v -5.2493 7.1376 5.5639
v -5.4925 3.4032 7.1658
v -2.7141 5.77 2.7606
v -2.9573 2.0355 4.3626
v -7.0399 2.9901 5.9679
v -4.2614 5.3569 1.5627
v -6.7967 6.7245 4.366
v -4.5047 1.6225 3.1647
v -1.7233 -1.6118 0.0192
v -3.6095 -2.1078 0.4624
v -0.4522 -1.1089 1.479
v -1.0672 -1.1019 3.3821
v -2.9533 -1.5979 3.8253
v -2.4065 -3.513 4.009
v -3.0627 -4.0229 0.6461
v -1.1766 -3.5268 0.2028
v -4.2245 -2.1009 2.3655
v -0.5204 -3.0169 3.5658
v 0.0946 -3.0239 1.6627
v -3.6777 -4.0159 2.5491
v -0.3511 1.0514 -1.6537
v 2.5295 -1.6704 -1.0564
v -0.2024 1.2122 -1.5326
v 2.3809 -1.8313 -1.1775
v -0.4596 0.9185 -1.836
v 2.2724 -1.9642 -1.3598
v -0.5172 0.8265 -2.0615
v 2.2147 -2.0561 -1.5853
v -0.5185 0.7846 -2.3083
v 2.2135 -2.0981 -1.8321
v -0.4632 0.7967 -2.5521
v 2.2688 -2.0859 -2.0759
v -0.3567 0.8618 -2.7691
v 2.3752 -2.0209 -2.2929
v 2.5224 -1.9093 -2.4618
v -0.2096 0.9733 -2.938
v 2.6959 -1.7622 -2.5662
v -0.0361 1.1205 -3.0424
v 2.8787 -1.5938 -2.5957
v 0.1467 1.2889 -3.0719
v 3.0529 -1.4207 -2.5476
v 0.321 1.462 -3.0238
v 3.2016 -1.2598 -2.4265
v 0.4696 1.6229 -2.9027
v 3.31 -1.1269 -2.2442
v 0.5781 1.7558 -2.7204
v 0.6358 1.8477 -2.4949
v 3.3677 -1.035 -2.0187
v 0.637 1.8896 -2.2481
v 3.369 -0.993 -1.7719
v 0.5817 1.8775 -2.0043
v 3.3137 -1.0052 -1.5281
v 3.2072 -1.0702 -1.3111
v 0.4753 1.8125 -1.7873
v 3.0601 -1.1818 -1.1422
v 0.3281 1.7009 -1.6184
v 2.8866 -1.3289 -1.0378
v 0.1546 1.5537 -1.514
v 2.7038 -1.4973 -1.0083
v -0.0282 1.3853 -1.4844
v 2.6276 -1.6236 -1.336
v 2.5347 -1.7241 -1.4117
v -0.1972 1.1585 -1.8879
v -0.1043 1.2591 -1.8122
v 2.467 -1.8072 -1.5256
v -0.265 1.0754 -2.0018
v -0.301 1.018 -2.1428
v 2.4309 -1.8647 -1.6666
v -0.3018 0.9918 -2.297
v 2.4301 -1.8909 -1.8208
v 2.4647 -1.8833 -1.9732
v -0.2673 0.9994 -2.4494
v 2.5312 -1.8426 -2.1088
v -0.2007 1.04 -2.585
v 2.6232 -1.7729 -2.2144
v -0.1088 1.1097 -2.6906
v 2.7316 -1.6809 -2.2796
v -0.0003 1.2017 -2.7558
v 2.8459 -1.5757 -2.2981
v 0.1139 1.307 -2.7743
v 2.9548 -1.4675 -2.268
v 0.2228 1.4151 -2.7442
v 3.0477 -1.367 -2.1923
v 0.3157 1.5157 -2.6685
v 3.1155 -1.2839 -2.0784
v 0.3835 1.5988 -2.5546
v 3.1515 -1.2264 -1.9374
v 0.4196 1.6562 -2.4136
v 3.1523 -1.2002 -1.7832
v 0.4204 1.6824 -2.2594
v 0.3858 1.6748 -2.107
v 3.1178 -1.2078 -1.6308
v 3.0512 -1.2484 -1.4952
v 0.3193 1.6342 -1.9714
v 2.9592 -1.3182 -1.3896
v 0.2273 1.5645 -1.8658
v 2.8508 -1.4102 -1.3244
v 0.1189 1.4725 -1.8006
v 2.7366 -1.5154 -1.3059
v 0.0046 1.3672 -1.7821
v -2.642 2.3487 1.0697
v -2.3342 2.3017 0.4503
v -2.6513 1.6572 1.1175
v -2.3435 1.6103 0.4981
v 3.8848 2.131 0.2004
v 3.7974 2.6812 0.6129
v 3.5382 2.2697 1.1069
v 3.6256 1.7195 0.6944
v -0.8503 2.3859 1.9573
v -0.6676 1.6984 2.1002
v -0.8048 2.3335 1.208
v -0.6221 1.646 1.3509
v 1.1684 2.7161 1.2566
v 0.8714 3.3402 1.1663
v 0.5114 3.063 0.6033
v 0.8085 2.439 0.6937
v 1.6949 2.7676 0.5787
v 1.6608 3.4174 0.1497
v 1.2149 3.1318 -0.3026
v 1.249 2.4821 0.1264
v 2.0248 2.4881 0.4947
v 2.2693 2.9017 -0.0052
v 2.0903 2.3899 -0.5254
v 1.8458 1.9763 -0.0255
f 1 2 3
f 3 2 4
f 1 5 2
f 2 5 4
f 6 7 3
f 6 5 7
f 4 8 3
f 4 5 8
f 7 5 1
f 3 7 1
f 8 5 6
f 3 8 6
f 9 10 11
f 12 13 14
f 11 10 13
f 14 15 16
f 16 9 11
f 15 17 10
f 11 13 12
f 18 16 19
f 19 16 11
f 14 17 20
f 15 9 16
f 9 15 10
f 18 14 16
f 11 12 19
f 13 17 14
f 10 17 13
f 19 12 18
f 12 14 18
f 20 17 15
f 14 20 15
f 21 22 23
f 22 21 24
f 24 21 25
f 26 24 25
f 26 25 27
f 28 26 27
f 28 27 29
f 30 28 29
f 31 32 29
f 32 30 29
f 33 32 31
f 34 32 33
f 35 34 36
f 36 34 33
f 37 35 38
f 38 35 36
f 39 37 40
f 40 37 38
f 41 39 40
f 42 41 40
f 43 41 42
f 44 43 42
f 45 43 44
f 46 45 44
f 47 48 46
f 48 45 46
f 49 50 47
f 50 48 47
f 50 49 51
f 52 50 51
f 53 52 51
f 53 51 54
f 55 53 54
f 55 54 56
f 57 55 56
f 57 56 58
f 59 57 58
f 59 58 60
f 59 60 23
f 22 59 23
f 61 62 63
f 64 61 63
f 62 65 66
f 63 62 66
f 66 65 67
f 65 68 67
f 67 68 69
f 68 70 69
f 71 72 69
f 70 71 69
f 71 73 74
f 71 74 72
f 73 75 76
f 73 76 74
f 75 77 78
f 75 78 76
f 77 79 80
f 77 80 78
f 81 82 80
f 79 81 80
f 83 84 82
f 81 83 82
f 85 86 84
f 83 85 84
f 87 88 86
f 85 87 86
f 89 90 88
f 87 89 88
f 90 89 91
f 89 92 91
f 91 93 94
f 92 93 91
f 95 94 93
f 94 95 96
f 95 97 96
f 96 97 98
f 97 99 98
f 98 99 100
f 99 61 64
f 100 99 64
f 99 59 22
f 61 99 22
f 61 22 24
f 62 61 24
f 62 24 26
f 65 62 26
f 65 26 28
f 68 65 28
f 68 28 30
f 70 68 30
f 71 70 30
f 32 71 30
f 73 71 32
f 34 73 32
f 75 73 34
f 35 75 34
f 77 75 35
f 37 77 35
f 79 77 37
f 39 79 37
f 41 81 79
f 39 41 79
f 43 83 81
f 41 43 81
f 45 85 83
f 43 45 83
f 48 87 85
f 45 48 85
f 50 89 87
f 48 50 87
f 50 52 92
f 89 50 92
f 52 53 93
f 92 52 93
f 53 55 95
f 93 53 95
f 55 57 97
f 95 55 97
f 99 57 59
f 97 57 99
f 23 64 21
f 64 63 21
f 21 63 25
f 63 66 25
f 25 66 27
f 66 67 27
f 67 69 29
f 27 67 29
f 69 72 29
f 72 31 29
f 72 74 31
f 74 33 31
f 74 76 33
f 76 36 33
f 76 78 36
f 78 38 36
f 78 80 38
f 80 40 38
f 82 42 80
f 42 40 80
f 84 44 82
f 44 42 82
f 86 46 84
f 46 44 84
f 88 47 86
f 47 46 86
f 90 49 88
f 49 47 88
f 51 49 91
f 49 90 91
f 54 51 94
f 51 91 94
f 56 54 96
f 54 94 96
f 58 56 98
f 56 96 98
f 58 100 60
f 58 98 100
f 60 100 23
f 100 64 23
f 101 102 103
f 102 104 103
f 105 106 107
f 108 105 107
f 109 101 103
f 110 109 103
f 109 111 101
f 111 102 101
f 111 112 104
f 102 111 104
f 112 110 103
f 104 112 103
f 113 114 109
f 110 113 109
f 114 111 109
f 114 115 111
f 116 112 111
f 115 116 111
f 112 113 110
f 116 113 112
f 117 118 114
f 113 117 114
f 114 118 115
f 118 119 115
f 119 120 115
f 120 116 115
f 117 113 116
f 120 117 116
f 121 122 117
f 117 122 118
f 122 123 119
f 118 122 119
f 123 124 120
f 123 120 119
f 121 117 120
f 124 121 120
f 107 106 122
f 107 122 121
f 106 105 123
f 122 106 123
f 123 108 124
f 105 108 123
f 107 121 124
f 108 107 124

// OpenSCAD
/*
-------------------------------------------------------------------------
faces.scad: Generate faces for simply polyhedrons in OpenSCAD
Copyright (C) 2015 Runsun Pan (run+sun (at) gmail.com) 
Source: https://github.com/runsun/faces.scad

This program is free software; you can redistribute it and/or
modify it under the terms of the GNU General Public License
as published by the Free Software Foundation; either version 2
of the License, or (at your option) any later version.

This program is distributed in the hope that it will be useful,
but WITHOUT ANY WARRANTY; without even the implied warranty of
MERCHANTABILITY or FITNESS FOR A PARTICULAR PURPOSE.  See the
GNU General Public License for more details.

You should have received a copy of the GNU General Public License along 
with this program; if not, see <http://www.gnu.org/licenses/gpl-2.0.html>
-------------------------------------------------------------------------
*/

// Run showall() to see all exaples. 

function reverse(o)=
(
    [ for(i=[0:len(o)-1]) o[len(o)-1-i] ]
);

    
function joinarr(arr, _rtn=[], _i=0)= 
(
	_i>len(arr)-1? _rtn
	: joinarr( arr, concat( _rtn, arr[_i]), _i+1)   
); 
    
    
function roll(arr,count=1)=
(
    let( L= len(arr)
       , count= count<0?L+count:count
       )
 	count==0 || count>L-1? arr
	:concat( [for(i= [L-count:L-1]) arr[i]]
		   , [for(i= [0:L-count-1]) arr[i]]
		   )
); 
   
           
function transpose(mm)=
(
	[ for(c=[0:len(mm[0])-1]) 
        [for(r=[0:len(mm)-1]) 
             mm[r][c]] ]
);           

    
function faces( shape="rod" // cubesides|rod|chain|ring|tube
              , nside=6     // # of sides
              , nseg=3)=    // # of segments for chain
(

    let (  s = nside                                
        , s2= 2*nside                              
        , s3= 3*nside
        , rng= [for (i=[0:s-1])i]
        , rng2= [for (i= [s:s2-1]) i ]
        , rngnn=[for( i= [nseg*nside:(nseg+1)*nside-1]) i ]
                //range( (nseg)*nside, (nseg+1)*nside)    
        )
        
	//==================================================
	// cubensides
    //
	//       _6-_
	//    _-' |  '-_
	// 5 '_   |     '-7
	//   | '-_|   _-'| 
	//   |    |-4'   |
	//   |   _-_|    |
	//   |_-' 2 |'-_ | 
	//  1-_     |   '-3
	//     '-_  | _-'
	//        '-.'
	//          0
	shape=="cubesides"
	? [ for(i= rng) //range(s))
		  [ i
			, i==s-1?0:i+1
			, (i==s-1?0:i+1)+s
			, i+s
		  ]
	  ]

    //==================================================
	// rod
	
    : shape=="rod"
	? concat( [ reverse(rng)]
              , [rng2] //[range(s,s2) ],
			  , faces("cubesides", s) ) 
              
    //==================================================
	// tube
	//             _6-_
	//          _-' |  '-_
	//       _-'   14-_   '-_
	//    _-'    _-'| _-15   '-_
	//   5_  13-'  _-'  |      .7
	//   | '-_ |'12_2-_ |   _-' | 
	//   |    '-_'|    '|_-'    |
	//   |   _-| '-_10_-|'-_    |
	//   |_-'  |_-| 4' _-11 '-_ | 
	//   1_   9-  | |-'       _-3
	//     '-_  '-8'|      _-'    
	//        '-_   |   _-'
	//           '-_|_-'
    //              0
    //  bottom=	 [ [0,3,11, 8]
    //			 , [1,0, 8, 9]
    //			 , [2,1, 9,10]
    //			 , [3,2,10,11] ];
    //
    //	top	=	 [ [4,5,13,12]
    //			 , [5,6,14,13]
    //			 , [6,7,15,14]
    //			 , [7,4,12,15] ]
    : shape=="tube"
	? concat( faces( "cubesides", s )  // outside sides
			, [ for(f=faces( "cubesides", s ))    // inner sides
					reverse( [ for(i=f) i+s2] )
			  ]
			, [ for(i=rng)         // bottom faces
				   [i, (i+s-1)%s, ((i+s-1)%s)+s2, i+s2 ] 
			  ]
			, [ for(i=rng2)     // top faces
				  [i, i==s2-1?s:i+1, i==s2-1?s3:i+s2+1, i+s2 ]
			  ]
			)	  

	//==================================================
	// chain                
	//       _6-_-------10------14
	//    _-' |  '-_    | '-_   | '-_
	//  2'_   |     '-5-----'9-------13
	//   | '-_|   _-'|  |    |  |    |
	//   |    |-1'   |  |    |  |    |
	//   |   _-_|----|-11_---|--15   |
	//   |_-' 7 |'-_ |    '-_|    '-_| 
	//  3-_     |   '-4------8-------12
	//     '-_  | _-'
	//        '-.'
	//          0
	//
	:shape=="chain"
	? concat( [ reverse(rng)] // starting face
			, [[for(i=[ nseg*s: (nseg+1)*s-1])i]] // ending face
			, joinarr( [ for(c= [0:nseg-1]) 
				 [ for(f=faces("cubesides", nside))
					[ for(i=f) i+c*nside]
				 ]
			  ])
			)  
                    
    //==================================================
	// ring 
 	/*  
        ring is a chain-like shape with the beg
        and end faces joined.
                    
        A ring with nseg=6, nside=4            
    
               13-------------9
             _-`|`-_______10-` `-_
          _-'   _-`|       |`-_   `-_ 
      17.'____.' -_|_____11|   `-6____.5
        |`-_  |`-_-`        `-_-`| _-`| 
        |   `-_ _-`-22____2_-`  _-`   | 
      16|_____|`-_/_|______|\_-` |7__ |4
         `-_   21|  |      | |1 `  _-`
            `-_  |  |23___3| |  _-`
               `-|-/________\|-`
                 20          0
    
        Using a faces("chain", nside=4, count=5) ### NOTE: count=5
        and:
        
        joining faces:
        fj= [ [ 0,1,21,20 ]
            , [ 1,2,22,21 ]
            , [ 2,3,23,22 ]
            , [ 3,0,20,23 ]
            ]
            
        ref: roll([0,1,2,3],-1)= [1,2,3,0]
            
        Transposed 
        fjt=[ [  0, 1, 2, 3 ]  range(nside) = A
            , [  1, 2, 3, 0 ]  roll( A ,-1)
            , [ 21,22,23,20 ]  roll( B ,-1)
            , [ 20,21,22,23 ]  range( (nseg-1)*nside, nseg*nside) = B
            ]
        
    */
    
           
    : shape=="ring"  
	? concat( transpose(
               [ rng 
               , roll( rng, -1)
               , roll( rngnn,-1)
               , rngnn
               ] 
              )
            , joinarr( [ for(c= [0:nseg-1])
				 [ for(f=faces("cubesides", nside))
					[ for(i=f) i+c*nside]
				 ]
			  ])
			)
                   
    //------------------------------------                
	:[]
);
  
module header(mod,color){
    echo(str("<span style='color:"
             , color, "'>", mod, " ( \"",color,"\" )"
             , "</span>"));
}    
    
                      

module cubesides_faces(color){  

    header(parent_module(1),color);
    
    pts0 = [ [-0.214054, 1.26998, -0.239369]
    , [-2.74931, 2.63763, 2.56388]
    , [-2.99255, -1.0968, 4.16585]
    , [-0.457295, -2.46445, 1.3626]
    , [-1.76143, 0.856897, -1.43728]
    , [-4.29668, 2.22455, 1.36597]
    , [-4.53993, -1.50988, 2.96794]
    , [-2.00467, -2.87753, 0.164688]
    ];
    pts = [ for( p=pts0 ) p+[-1,3,-3] ];
     
    //echo(pts = arrprn(pts,dep=3) );                    
   
    faces=faces("cubesides",nside=4);
    //echo(pts=pts,"<br/>", faces=faces);
    
    color( color, .5)
    polyhedron( points = pts, faces=faces );
}
//cubesides_faces();

module rod_faces1(color){

    header(parent_module(1),color);

    pts0 = [ [-0.214054, 1.26998, -0.239369]
    , [-2.74931, 2.63763, 2.56388]
    , [-2.99255, -1.0968, 4.16585]
    , [-0.457295, -2.46445, 1.3626]
    , [-1.76143, 0.856897, -1.43728]
    , [-4.29668, 2.22455, 1.36597]
    , [-4.53993, -1.50988, 2.96794]
    , [-2.00467, -2.87753, 0.164688]
    ];
    pts = [ for( p=pts0 ) p+[-2.5,4.5,3] ];
               
    //echo(pts = arrprn(pts,dep=3) );                    
    
    faces=faces("rod",nside=4);
    //echo(faces=faces);
    
    color( color, 0.9)
    polyhedron( points = pts, faces=faces );
}

//rod_faces1();

module rod_faces2(color){ 
    
  header(parent_module(1),color);
  
    pts = [ [-0.452198, -1.10886, 1.47902]
, [-1.72335, -1.61183, 0.0191524]
, [-3.60949, -2.10785, 0.462376]
, [-4.22447, -2.10091, 2.36546]
, [-2.95332, -1.59794, 3.82533]
, [-1.06718, -1.10192, 3.3821]
, [0.0945813, -3.02388, 1.6627]
, [-1.17657, -3.52685, 0.202832]
, [-3.06271, -4.02287, 0.646056]
, [-3.67769, -4.01592, 2.54914]
, [-2.40654, -3.51296, 4.00901]
, [-0.520406, -3.01694, 3.56578]
];
//    echo(pts = arrprn(pts,dep=3) );                    

    color( color, 0.9)
    polyhedron( points = pts
              , faces=faces("rod",nside=6) );
}

//rod_faces2();

module tube_faces(color){ 

    header(parent_module(1),color);

    // [out_bot, out_top, in_bot, in_top ] 
    ptgroups=
      [   [ [2.52951, -1.67042, -1.05641]
          , [2.38087, -1.8313, -1.17754]
          , [2.2724, -1.9642, -1.3598]
          , [2.21471, -2.05613, -1.58534]
          , [2.21346, -2.09807, -1.8321]
          , [2.26876, -2.08594, -2.0759]
          , [2.37521, -2.0209, -2.2929]
          , [2.52238, -1.90933, -2.46184]
          , [2.69586, -1.76216, -2.5662]
          , [2.87868, -1.59378, -2.59575]
          , [3.05294, -1.42068, -2.5476]
          , [3.20158, -1.2598, -2.42647]
          , [3.31005, -1.12689, -2.24422]
          , [3.36773, -1.03497, -2.01867]
          , [3.36898, -0.993022, -1.77192]
          , [3.31368, -1.00516, -1.52811]
          , [3.20723, -1.0702, -1.31112]
          , [3.06007, -1.18176, -1.14217]
          , [2.88658, -1.32894, -1.03782]
          , [2.70376, -1.49732, -1.00827]
          ]
        , [ [-0.202443, 1.21224, -1.5326]
          , [-0.351082, 1.05136, -1.65373]
          , [-0.459553, 0.918454, -1.83598]
          , [-0.517237, 0.826529, -2.06153]
          , [-0.518489, 0.784582, -2.30828]
          , [-0.463185, 0.796721, -2.55209]
          , [-0.356739, 0.861756, -2.76908]
          , [-0.209571, 0.973322, -2.93803]
          , [-0.0360863, 1.1205, -3.04238]
          , [0.146733, 1.28888, -3.07193]
          , [0.32099, 1.46198, -3.02379]
          , [0.46963, 1.62286, -2.90266]
          , [0.5781, 1.75576, -2.7204]
          , [0.635785, 1.84769, -2.49486]
          , [0.637036, 1.88963, -2.2481]
          , [0.581732, 1.8775, -2.0043]
          , [0.475286, 1.81246, -1.7873]
          , [0.328118, 1.70089, -1.61836]
          , [0.154634, 1.55372, -1.514]
          , [-0.0281853, 1.38534, -1.48445]
          ]
        , [ [2.62765, -1.62359, -1.33601]
          , [2.53475, -1.72414, -1.41172]
          , [2.46696, -1.80721, -1.52563]
          , [2.4309, -1.86466, -1.66659]
          , [2.43012, -1.89088, -1.82081]
          , [2.46469, -1.88329, -1.97319]
          , [2.53121, -1.84264, -2.10882]
          , [2.62319, -1.77291, -2.21441]
          , [2.73162, -1.68093, -2.27963]
          , [2.84588, -1.57569, -2.2981]
          , [2.95479, -1.4675, -2.26801]
          , [3.04769, -1.36696, -2.1923]
          , [3.11549, -1.28389, -2.07839]
          , [3.15154, -1.22644, -1.93742]
          , [3.15232, -1.20022, -1.7832]
          , [3.11776, -1.20781, -1.63082]
          , [3.05123, -1.24845, -1.4952]
          , [2.95925, -1.31818, -1.38961]
          , [2.85082, -1.41017, -1.32439]
          , [2.73656, -1.5154, -1.30592]
          ]
        , [ [-0.104299, 1.25906, -1.81219]
          , [-0.197199, 1.15852, -1.8879]
          , [-0.264993, 1.07545, -2.00181]
          , [-0.301046, 1.018, -2.14278]
          , [-0.301828, 0.991779, -2.297]
          , [-0.267263, 0.999366, -2.44938]
          , [-0.200734, 1.04001, -2.585]
          , [-0.108754, 1.10974, -2.69059]
          , [-0.000326299, 1.20173, -2.75581]
          , [0.113936, 1.30696, -2.77428]
          , [0.222847, 1.41515, -2.74419]
          , [0.315746, 1.5157, -2.66848]
          , [0.38354, 1.59877, -2.55457]
          , [0.419593, 1.65622, -2.41361]
          , [0.420375, 1.68244, -2.25939]
          , [0.38581, 1.67485, -2.10701]
          , [0.319281, 1.6342, -1.97138]
          , [0.227301, 1.56447, -1.86579]
          , [0.118874, 1.47249, -1.80057]
          , [0.00461182, 1.36725, -1.7821]
          ]
    ];
    //echo(len=len(ptgroups), ptgroups = arrprn(ptgroups,dep=3) );  

    pts = concat( ptgroups[0]
                , ptgroups[1]
                , ptgroups[2]
                , ptgroups[3]);
    
    color( color, 1)
    polyhedron( points = pts
              , faces=faces("tube",nside= len(ptgroups[0])) );
}

//tube_faces();

module chain_faces(color){ 
    
   header(parent_module(1),color);
 
   // slice_pts: 
   
    slpts = [ [ [-2.6513, 1.65721, 1.11746]
  , [-2.64199, 2.34868, 1.06966]
  , [-2.33418, 2.30173, 0.450336]
  , [-2.34349, 1.61026, 0.498133]
  ]
, [ [-0.667631, 1.69843, 2.1002]
  , [-0.850301, 2.38591, 1.9573]
  , [-0.804771, 2.33351, 1.20804]
  , [-0.622101, 1.64603, 1.35095]
  ]
, [ [1.16845, 2.71612, 1.25665]
  , [0.871355, 3.34019, 1.16631]
  , [0.511409, 3.06304, 0.603344]
  , [0.808503, 2.43897, 0.693682]
  ]
, [ [1.69493, 2.76762, 0.578666]
  , [1.66078, 3.41741, 0.149718]
  , [1.21488, 3.13185, -0.302555]
  , [1.24903, 2.48207, 0.126393]
  ]
, [ [2.02477, 2.48809, 0.494697]
  , [2.26931, 2.90169, -0.00519821]
  , [2.09034, 2.38992, -0.525424]
  , [1.8458, 1.97632, -0.0255294]
  ]
, [ [3.53821, 2.2697, 1.10687]
  , [3.7974, 2.68119, 0.612901]
  , [3.88484, 2.13098, 0.20044]
  , [3.62565, 1.71949, 0.694411]
  ]
];

    nseg= len(slpts)-1;
    nside= len(slpts[0]);
    
    pts = joinarr(slpts);
    //echo(ptslen=len(pts), pts = arrprn(pts,dep=3) );                    

    faces = faces("chain",nside=nside,nseg=nseg);
    //echo(faces = faces);
    //echo( faceslen=len(faces), faces= arrprn(faces,dep=3));
    color( color, 1)
    polyhedron( points = pts
              , faces=faces );
}

//chain_faces();

module ring_faces(color){ 
    
    header(parent_module(1),color);

pts=[ [ [-5.67712, -0.0981671, -6.21628]
  , [-5.31215, 0.76187, -4.44791]
  , [-4.64341, -0.983785, -3.73694]
  , [-5.00839, -1.84382, -5.50531]
  ]
, [ [-8.35792, -1.67811, -4.8946]
  , [-7.99295, -0.818073, -3.12623]
  , [-6.43061, -2.03708, -2.85582]
  , [-6.79559, -2.89712, -4.62419]
  ]
, [ [-9.55063, -4.41913, -3.31535]
  , [-9.18566, -3.55909, -1.54698]
  , [-7.22575, -3.86443, -1.80299]
  , [-7.59072, -4.72446, -3.57136]
  ]
, [ [-8.87656, -7.45098, -1.97995]
  , [-8.51159, -6.59094, -0.211583]
  , [-6.77637, -5.88566, -0.912722]
  , [-7.14135, -6.7457, -2.68109]
  ]
, [ [-6.54974, -9.81106, -1.31237]
  , [-6.18477, -8.95102, 0.455998]
  , [-5.22516, -7.45904, -0.467668]
  , [-5.59013, -8.31908, -2.23604]
  ]
, [ [-3.30891, -10.7501, -1.52456]
  , [-2.94394, -9.89002, 0.243807]
  , [-3.0646, -8.08505, -0.609129]
  , [-3.42958, -8.94508, -2.3775]
  ]
, [ [-0.18301, -9.96986, -2.54916]
  , [0.181961, -9.10983, -0.780787]
  , [-0.980672, -7.56492, -1.29219]
  , [-1.34564, -8.42495, -3.06056]
  ]
, [ [1.83551, -7.71817, -4.06085]
  , [2.20048, -6.85814, -2.29248]
  , [0.365006, -6.06379, -2.29999]
  , [3.40909e-05, -6.92383, -4.06836]
  ]
, [ [2.10577, -4.70988, -5.5797]
  , [2.47075, -3.84985, -3.81133]
  , [0.545184, -4.05826, -3.31255]
  , [0.180213, -4.9183, -5.08092]
  ]
, [ [0.541986, -1.90011, -6.62347]
  , [0.906957, -1.04007, -4.8551]
  , [-0.497341, -2.18508, -4.0084]
  , [-0.862313, -3.04511, -5.77677]
  ]
, [ [-2.35937, -0.180924, -6.86078]
  , [-1.9944, 0.679113, -5.09241]
  , [-2.43158, -1.03896, -4.16661]
  , [-2.79655, -1.89899, -5.93498]
  ]
];    

     nseg = len(pts)-1;
     nside = len(pts[0]);
     //echo( nseg=nseg, nside=nside );
     //echo( len=len(pts), pts = arrprn(pts,dep=3) );   
     faces = faces("ring", nside=4, nseg=10);
     
     //echo( lenfaces=len(faces)
     //    , faces = faces );
  
     color(color,1)   
     polyhedron( points= joinarr(pts), faces=faces);   
    
}

//ring_faces();

module showall(){
    echo("");
    cubesides_faces("olive");
    rod_faces1("olive");
    rod_faces2("red");
    tube_faces("green");
    chain_faces("darkcyan");
    ring_faces("darkslategray");
    echo("");
}    

showall();
